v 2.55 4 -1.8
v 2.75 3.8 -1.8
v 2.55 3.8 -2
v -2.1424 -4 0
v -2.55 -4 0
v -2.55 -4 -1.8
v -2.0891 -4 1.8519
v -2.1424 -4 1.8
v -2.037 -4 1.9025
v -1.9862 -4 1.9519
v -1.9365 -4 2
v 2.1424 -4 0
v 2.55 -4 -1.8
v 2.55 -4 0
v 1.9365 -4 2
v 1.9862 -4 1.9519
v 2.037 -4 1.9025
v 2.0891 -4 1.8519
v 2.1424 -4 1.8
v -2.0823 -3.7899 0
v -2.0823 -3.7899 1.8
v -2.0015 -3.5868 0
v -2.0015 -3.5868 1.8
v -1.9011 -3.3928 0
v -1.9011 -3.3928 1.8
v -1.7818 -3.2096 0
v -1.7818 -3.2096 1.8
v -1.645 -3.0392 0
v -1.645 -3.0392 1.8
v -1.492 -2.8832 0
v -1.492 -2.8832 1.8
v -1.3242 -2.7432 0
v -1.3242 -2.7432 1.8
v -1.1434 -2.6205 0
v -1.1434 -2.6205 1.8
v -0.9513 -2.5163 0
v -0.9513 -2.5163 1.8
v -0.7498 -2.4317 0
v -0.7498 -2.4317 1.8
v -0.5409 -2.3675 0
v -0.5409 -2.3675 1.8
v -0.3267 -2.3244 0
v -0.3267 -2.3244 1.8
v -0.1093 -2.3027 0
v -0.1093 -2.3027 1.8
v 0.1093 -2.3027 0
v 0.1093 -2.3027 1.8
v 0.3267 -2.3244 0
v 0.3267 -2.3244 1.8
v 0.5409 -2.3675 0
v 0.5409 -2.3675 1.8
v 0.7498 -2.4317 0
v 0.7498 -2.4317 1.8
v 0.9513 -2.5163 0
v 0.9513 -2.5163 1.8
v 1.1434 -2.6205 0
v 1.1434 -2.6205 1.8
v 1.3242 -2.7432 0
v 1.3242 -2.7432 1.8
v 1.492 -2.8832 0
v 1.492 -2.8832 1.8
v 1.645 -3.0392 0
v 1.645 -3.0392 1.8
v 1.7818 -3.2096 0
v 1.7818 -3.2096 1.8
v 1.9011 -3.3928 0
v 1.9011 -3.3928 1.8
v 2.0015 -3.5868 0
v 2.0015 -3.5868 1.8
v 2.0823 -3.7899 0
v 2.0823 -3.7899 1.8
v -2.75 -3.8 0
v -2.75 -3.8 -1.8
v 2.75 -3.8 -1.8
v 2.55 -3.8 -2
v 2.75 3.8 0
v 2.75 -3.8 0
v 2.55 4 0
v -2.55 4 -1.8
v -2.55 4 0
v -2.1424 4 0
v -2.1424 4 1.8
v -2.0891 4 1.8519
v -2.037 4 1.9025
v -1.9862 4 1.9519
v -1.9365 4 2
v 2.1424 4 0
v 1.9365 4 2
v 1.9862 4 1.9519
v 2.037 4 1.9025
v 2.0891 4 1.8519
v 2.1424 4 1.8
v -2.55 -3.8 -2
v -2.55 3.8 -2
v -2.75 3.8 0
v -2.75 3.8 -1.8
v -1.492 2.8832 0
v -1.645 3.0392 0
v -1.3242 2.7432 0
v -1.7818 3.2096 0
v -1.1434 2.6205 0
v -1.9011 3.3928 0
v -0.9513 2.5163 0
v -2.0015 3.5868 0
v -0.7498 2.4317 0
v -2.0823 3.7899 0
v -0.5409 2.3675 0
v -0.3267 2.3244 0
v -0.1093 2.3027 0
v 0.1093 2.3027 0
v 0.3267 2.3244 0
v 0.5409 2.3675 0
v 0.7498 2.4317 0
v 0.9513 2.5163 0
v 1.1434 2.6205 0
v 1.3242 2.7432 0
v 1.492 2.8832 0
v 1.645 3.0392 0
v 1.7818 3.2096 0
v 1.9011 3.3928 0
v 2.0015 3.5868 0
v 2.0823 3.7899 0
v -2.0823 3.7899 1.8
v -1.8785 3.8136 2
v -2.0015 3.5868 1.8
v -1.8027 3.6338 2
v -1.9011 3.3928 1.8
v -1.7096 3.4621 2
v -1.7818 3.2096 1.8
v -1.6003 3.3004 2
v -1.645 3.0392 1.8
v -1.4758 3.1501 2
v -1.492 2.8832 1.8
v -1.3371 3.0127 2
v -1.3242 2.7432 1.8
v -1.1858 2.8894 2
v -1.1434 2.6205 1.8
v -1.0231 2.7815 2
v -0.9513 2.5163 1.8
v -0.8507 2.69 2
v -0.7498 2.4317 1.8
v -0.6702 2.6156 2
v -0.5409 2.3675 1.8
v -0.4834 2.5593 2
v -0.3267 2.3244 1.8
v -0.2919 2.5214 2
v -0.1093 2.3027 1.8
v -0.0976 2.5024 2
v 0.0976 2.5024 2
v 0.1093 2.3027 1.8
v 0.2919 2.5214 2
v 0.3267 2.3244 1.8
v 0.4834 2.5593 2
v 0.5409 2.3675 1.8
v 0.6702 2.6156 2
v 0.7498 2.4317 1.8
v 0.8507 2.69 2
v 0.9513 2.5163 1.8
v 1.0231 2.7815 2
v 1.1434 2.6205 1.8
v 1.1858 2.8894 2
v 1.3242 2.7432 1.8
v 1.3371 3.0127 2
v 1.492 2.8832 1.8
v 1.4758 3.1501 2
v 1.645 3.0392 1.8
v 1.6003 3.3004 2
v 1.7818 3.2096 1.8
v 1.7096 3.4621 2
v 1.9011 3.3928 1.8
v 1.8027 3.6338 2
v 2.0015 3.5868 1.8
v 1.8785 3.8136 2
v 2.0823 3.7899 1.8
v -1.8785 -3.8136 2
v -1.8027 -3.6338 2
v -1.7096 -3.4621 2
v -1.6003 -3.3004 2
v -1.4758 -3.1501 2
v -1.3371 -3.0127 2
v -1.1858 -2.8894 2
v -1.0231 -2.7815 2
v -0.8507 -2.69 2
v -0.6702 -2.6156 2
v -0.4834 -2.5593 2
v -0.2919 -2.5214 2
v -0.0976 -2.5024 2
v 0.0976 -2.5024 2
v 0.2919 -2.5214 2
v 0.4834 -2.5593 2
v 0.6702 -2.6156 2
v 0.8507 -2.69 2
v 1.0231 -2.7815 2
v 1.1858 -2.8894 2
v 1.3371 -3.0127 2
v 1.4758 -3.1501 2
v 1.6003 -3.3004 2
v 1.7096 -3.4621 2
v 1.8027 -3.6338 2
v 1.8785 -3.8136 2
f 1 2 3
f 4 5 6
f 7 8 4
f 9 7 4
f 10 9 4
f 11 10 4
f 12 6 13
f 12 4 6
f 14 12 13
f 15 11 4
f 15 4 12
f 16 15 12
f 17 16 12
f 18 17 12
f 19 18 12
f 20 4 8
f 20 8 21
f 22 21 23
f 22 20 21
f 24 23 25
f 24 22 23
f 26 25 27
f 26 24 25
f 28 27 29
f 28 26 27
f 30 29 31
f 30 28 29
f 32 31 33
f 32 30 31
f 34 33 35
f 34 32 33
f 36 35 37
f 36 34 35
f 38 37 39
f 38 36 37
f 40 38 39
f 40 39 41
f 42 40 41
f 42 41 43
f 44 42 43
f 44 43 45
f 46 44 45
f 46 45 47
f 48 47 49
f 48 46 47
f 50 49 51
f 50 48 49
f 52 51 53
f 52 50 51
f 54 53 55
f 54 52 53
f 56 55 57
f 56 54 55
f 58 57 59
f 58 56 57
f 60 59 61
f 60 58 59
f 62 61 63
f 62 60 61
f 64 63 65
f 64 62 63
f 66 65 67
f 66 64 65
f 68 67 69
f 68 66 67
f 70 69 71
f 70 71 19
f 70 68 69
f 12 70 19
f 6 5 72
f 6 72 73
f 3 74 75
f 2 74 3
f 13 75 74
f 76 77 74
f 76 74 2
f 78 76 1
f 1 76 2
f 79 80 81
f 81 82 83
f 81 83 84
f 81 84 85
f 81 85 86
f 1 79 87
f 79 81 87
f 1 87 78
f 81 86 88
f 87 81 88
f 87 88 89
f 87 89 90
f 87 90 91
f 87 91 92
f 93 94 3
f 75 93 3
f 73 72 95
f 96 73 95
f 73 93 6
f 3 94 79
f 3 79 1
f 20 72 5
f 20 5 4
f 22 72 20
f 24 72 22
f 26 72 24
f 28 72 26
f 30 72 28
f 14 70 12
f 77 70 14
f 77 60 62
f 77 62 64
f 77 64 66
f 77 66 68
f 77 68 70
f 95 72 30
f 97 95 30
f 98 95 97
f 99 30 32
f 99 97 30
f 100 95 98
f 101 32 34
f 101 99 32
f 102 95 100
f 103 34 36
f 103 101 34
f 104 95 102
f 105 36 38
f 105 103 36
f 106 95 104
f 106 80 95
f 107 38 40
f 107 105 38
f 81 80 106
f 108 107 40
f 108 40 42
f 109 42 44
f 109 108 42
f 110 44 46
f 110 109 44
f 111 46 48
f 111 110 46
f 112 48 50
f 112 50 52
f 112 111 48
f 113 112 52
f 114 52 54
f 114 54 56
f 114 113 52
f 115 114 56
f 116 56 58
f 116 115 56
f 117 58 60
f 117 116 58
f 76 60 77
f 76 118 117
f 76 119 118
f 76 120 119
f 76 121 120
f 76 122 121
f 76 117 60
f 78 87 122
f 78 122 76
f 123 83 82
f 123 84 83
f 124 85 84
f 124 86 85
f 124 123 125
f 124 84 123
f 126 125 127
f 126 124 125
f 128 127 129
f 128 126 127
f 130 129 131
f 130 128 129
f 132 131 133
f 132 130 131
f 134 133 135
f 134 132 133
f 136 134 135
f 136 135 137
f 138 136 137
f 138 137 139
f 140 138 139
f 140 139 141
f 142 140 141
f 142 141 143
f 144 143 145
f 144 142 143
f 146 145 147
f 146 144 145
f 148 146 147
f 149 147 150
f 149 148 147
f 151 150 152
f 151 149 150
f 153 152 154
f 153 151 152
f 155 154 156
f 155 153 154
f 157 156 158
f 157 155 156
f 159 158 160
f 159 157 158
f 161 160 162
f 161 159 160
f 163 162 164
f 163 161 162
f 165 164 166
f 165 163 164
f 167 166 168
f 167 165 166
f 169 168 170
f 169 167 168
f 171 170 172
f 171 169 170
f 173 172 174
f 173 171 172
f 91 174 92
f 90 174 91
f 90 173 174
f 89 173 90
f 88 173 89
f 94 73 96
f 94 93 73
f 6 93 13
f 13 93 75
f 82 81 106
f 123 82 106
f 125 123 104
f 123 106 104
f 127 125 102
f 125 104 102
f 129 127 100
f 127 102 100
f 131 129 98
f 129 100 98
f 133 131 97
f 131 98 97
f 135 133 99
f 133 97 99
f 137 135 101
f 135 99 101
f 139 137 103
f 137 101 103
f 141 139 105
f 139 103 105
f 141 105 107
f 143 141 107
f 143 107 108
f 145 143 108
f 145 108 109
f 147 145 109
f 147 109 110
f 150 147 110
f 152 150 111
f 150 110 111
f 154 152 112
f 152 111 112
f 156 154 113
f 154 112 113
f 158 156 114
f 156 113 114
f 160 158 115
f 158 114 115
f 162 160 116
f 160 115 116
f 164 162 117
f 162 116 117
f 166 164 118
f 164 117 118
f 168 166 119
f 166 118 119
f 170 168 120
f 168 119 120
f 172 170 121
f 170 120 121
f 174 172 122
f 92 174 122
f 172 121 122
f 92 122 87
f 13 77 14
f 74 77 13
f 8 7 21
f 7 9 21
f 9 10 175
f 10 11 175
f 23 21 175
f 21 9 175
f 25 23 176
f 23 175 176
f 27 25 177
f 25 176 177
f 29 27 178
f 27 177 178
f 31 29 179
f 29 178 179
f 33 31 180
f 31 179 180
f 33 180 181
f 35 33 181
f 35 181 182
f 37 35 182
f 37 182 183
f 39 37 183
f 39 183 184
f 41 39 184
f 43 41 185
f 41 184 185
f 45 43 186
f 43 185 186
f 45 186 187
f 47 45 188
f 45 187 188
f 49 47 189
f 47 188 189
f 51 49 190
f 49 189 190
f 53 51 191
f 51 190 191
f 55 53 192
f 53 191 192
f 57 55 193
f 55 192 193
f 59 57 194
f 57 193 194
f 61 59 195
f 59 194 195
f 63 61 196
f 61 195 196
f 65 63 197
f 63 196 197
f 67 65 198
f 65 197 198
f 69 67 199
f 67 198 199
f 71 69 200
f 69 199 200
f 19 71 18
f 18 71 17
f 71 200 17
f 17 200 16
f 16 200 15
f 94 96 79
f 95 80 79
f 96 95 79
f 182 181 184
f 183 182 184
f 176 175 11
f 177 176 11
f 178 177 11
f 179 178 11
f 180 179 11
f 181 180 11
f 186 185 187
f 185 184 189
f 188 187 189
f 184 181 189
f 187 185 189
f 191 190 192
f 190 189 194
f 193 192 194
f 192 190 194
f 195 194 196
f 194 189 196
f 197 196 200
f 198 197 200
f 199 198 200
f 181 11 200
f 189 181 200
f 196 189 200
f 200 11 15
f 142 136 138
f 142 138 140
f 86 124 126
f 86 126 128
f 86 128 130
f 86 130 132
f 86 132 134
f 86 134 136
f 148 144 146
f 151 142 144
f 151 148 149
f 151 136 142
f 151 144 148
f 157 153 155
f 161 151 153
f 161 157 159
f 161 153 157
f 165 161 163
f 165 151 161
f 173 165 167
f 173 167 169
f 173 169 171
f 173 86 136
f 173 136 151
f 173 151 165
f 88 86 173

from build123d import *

# Parameters (mm, degrees)
SKETCH1_W           = 5.5
SKETCH1_H           = 8
BOSS_EXTRUDE1_DEPTH = 2
SLOT_TAB_DEPTH      = 2
DEBURS_SIZE         = 0.2


with BuildPart() as part:
    # Sketch1 → Boss-Extrude1 (new body)
    with BuildSketch(Plane.XY):
        Rectangle(SKETCH1_W, SKETCH1_H)
    extrude(amount=-BOSS_EXTRUDE1_DEPTH)

    # Sketch2 → Slot Tab (add)
    with BuildSketch(Plane.XY):
        with BuildLine():
            ThreePointArc((-2.142428529, 4), (0, 2.3), (2.142428529, 4))
            Line((2.142428529, 4), (-2.142428529, 4))
        make_face()
    slot_tab = extrude(amount=SLOT_TAB_DEPTH)

    # Slot Tabs: Slot Tab across plane
    add(slot_tab.mirror(Plane.ZX))

    # Deburs
    deburs_edges = [part.edges().sort_by_distance(p)[0] for p in [
        (-2.75, 0, -2),
        (0, 2.3, 2),
        (0, -4, -2),
        (0, -2.3, 2),
        (2.75, 0, -2),
        (2.75, -4, -1),
        (-2.75, -4, -1),
        (-2.75, 4, -1),
        (2.75, 4, -1),
        (0, 4, -2),
    ]]
    chamfer(deburs_edges, length=DEBURS_SIZE)


solid = part.part
